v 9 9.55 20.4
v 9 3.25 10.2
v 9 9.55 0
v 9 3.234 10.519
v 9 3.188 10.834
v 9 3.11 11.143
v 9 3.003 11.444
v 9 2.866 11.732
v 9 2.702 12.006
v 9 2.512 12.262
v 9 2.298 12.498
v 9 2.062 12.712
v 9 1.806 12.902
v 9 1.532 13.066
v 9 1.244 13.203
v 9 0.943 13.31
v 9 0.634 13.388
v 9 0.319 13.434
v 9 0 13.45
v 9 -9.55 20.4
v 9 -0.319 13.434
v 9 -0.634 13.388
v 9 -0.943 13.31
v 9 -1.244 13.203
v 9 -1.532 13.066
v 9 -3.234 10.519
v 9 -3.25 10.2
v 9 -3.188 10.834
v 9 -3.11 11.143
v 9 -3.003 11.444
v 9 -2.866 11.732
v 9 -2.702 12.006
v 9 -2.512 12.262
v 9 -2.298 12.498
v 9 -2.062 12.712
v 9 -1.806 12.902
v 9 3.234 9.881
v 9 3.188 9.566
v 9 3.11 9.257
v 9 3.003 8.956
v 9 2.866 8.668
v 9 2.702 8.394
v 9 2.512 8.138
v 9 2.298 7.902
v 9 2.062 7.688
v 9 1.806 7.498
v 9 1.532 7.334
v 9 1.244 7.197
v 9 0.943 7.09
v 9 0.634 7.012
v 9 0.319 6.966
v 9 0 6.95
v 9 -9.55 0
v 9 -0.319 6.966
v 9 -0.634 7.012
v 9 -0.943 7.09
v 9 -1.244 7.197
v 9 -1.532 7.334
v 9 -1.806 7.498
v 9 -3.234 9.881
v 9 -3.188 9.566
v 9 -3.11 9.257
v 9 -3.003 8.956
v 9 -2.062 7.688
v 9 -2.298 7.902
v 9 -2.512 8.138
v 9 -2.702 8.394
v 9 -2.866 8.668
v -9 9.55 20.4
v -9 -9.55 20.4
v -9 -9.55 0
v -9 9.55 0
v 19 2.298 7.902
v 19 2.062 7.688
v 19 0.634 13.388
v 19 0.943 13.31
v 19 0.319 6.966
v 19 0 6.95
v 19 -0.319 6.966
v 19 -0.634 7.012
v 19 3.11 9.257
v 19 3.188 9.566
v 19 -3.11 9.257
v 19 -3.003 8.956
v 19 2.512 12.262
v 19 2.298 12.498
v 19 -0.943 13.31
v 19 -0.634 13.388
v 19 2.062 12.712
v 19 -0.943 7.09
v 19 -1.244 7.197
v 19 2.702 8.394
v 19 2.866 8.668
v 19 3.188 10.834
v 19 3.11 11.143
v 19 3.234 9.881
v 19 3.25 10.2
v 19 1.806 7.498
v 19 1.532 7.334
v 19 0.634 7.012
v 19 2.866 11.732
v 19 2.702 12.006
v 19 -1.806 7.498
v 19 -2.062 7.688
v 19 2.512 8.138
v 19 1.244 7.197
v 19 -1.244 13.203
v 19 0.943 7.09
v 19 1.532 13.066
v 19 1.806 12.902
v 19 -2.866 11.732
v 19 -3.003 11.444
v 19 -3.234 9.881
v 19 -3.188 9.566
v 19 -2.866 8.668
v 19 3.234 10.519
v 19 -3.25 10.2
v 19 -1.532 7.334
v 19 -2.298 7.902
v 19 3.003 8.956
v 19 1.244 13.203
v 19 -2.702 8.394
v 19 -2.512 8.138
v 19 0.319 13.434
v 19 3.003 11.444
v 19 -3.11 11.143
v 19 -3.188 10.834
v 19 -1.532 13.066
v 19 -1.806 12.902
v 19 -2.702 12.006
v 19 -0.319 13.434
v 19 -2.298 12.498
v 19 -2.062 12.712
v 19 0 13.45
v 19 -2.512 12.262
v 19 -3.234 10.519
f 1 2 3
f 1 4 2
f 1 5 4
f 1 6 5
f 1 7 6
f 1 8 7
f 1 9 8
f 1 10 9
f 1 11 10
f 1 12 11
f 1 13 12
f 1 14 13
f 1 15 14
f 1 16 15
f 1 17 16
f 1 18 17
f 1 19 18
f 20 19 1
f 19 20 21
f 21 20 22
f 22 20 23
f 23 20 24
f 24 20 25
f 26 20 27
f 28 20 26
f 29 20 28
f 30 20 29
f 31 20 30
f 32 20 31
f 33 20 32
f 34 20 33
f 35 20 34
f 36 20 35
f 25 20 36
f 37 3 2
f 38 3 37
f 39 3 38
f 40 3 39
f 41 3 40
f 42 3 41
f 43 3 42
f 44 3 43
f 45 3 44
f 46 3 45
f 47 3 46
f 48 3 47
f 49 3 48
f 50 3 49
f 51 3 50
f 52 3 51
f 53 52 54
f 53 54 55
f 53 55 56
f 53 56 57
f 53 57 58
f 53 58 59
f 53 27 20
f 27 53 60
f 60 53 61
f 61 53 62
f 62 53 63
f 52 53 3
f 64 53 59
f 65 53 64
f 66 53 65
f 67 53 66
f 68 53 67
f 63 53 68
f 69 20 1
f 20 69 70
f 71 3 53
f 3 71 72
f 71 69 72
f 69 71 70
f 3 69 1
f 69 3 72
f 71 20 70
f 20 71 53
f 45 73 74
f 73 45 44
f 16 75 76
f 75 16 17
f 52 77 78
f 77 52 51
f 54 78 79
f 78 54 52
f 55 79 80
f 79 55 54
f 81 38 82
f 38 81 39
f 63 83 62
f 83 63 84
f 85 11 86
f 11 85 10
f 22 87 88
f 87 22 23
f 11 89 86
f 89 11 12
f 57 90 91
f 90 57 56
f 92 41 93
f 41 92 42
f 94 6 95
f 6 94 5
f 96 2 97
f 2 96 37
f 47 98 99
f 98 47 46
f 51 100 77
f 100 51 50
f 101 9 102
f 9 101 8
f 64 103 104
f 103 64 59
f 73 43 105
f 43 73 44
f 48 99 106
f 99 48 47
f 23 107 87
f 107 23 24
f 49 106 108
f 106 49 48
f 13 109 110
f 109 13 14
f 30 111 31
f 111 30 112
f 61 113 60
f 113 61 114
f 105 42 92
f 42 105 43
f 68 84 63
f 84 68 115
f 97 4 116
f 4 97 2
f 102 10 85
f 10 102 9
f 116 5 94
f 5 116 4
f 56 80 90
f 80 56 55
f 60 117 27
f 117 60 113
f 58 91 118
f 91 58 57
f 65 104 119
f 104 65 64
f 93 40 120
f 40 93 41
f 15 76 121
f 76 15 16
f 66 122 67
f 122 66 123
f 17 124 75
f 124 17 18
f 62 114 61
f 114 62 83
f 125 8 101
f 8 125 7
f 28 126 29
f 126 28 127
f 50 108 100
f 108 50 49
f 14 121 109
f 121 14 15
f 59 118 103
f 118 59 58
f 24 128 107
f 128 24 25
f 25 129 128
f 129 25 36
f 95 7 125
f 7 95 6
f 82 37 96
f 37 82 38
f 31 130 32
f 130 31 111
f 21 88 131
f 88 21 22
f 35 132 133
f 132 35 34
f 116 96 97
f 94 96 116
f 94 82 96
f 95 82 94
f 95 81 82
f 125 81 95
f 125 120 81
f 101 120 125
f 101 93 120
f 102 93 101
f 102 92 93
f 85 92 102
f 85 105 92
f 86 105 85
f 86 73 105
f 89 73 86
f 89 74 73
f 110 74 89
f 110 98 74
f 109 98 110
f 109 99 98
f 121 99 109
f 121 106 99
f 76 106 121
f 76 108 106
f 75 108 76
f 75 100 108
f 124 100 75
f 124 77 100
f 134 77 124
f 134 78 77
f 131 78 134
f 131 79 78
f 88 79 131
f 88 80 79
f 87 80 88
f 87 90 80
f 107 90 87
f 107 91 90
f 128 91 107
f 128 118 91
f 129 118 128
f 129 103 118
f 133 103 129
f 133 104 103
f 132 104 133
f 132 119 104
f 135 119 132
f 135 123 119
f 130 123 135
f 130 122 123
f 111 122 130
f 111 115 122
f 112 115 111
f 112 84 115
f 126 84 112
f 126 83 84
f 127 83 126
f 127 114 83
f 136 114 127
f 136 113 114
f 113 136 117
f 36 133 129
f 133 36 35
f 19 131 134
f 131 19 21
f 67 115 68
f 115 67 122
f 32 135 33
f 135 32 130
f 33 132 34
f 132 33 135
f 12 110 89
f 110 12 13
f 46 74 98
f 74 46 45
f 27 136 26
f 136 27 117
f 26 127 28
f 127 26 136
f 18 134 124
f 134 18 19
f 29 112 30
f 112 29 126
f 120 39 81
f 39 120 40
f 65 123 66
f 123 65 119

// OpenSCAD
// Pi Screen Rail Mount

$fn = 64;

block_wid = 19.1;
block_h = 20.4;
block_dep = 18.0;
hole_dia = 6.4;

screen_screw_hole_dia = 4.0;
screen_hole_dist = 71.6;

module block_with_hole() {
    translate([0,0,block_h/2])
    cube([block_dep, block_wid, block_h], center=true);
    translate([block_dep/2, 0, block_h/2])
    rotate([0,90,0])
    cylinder(d=6.5, h=10.0);
}

module screen_attachment() {
    
    
}

block_with_hole();
